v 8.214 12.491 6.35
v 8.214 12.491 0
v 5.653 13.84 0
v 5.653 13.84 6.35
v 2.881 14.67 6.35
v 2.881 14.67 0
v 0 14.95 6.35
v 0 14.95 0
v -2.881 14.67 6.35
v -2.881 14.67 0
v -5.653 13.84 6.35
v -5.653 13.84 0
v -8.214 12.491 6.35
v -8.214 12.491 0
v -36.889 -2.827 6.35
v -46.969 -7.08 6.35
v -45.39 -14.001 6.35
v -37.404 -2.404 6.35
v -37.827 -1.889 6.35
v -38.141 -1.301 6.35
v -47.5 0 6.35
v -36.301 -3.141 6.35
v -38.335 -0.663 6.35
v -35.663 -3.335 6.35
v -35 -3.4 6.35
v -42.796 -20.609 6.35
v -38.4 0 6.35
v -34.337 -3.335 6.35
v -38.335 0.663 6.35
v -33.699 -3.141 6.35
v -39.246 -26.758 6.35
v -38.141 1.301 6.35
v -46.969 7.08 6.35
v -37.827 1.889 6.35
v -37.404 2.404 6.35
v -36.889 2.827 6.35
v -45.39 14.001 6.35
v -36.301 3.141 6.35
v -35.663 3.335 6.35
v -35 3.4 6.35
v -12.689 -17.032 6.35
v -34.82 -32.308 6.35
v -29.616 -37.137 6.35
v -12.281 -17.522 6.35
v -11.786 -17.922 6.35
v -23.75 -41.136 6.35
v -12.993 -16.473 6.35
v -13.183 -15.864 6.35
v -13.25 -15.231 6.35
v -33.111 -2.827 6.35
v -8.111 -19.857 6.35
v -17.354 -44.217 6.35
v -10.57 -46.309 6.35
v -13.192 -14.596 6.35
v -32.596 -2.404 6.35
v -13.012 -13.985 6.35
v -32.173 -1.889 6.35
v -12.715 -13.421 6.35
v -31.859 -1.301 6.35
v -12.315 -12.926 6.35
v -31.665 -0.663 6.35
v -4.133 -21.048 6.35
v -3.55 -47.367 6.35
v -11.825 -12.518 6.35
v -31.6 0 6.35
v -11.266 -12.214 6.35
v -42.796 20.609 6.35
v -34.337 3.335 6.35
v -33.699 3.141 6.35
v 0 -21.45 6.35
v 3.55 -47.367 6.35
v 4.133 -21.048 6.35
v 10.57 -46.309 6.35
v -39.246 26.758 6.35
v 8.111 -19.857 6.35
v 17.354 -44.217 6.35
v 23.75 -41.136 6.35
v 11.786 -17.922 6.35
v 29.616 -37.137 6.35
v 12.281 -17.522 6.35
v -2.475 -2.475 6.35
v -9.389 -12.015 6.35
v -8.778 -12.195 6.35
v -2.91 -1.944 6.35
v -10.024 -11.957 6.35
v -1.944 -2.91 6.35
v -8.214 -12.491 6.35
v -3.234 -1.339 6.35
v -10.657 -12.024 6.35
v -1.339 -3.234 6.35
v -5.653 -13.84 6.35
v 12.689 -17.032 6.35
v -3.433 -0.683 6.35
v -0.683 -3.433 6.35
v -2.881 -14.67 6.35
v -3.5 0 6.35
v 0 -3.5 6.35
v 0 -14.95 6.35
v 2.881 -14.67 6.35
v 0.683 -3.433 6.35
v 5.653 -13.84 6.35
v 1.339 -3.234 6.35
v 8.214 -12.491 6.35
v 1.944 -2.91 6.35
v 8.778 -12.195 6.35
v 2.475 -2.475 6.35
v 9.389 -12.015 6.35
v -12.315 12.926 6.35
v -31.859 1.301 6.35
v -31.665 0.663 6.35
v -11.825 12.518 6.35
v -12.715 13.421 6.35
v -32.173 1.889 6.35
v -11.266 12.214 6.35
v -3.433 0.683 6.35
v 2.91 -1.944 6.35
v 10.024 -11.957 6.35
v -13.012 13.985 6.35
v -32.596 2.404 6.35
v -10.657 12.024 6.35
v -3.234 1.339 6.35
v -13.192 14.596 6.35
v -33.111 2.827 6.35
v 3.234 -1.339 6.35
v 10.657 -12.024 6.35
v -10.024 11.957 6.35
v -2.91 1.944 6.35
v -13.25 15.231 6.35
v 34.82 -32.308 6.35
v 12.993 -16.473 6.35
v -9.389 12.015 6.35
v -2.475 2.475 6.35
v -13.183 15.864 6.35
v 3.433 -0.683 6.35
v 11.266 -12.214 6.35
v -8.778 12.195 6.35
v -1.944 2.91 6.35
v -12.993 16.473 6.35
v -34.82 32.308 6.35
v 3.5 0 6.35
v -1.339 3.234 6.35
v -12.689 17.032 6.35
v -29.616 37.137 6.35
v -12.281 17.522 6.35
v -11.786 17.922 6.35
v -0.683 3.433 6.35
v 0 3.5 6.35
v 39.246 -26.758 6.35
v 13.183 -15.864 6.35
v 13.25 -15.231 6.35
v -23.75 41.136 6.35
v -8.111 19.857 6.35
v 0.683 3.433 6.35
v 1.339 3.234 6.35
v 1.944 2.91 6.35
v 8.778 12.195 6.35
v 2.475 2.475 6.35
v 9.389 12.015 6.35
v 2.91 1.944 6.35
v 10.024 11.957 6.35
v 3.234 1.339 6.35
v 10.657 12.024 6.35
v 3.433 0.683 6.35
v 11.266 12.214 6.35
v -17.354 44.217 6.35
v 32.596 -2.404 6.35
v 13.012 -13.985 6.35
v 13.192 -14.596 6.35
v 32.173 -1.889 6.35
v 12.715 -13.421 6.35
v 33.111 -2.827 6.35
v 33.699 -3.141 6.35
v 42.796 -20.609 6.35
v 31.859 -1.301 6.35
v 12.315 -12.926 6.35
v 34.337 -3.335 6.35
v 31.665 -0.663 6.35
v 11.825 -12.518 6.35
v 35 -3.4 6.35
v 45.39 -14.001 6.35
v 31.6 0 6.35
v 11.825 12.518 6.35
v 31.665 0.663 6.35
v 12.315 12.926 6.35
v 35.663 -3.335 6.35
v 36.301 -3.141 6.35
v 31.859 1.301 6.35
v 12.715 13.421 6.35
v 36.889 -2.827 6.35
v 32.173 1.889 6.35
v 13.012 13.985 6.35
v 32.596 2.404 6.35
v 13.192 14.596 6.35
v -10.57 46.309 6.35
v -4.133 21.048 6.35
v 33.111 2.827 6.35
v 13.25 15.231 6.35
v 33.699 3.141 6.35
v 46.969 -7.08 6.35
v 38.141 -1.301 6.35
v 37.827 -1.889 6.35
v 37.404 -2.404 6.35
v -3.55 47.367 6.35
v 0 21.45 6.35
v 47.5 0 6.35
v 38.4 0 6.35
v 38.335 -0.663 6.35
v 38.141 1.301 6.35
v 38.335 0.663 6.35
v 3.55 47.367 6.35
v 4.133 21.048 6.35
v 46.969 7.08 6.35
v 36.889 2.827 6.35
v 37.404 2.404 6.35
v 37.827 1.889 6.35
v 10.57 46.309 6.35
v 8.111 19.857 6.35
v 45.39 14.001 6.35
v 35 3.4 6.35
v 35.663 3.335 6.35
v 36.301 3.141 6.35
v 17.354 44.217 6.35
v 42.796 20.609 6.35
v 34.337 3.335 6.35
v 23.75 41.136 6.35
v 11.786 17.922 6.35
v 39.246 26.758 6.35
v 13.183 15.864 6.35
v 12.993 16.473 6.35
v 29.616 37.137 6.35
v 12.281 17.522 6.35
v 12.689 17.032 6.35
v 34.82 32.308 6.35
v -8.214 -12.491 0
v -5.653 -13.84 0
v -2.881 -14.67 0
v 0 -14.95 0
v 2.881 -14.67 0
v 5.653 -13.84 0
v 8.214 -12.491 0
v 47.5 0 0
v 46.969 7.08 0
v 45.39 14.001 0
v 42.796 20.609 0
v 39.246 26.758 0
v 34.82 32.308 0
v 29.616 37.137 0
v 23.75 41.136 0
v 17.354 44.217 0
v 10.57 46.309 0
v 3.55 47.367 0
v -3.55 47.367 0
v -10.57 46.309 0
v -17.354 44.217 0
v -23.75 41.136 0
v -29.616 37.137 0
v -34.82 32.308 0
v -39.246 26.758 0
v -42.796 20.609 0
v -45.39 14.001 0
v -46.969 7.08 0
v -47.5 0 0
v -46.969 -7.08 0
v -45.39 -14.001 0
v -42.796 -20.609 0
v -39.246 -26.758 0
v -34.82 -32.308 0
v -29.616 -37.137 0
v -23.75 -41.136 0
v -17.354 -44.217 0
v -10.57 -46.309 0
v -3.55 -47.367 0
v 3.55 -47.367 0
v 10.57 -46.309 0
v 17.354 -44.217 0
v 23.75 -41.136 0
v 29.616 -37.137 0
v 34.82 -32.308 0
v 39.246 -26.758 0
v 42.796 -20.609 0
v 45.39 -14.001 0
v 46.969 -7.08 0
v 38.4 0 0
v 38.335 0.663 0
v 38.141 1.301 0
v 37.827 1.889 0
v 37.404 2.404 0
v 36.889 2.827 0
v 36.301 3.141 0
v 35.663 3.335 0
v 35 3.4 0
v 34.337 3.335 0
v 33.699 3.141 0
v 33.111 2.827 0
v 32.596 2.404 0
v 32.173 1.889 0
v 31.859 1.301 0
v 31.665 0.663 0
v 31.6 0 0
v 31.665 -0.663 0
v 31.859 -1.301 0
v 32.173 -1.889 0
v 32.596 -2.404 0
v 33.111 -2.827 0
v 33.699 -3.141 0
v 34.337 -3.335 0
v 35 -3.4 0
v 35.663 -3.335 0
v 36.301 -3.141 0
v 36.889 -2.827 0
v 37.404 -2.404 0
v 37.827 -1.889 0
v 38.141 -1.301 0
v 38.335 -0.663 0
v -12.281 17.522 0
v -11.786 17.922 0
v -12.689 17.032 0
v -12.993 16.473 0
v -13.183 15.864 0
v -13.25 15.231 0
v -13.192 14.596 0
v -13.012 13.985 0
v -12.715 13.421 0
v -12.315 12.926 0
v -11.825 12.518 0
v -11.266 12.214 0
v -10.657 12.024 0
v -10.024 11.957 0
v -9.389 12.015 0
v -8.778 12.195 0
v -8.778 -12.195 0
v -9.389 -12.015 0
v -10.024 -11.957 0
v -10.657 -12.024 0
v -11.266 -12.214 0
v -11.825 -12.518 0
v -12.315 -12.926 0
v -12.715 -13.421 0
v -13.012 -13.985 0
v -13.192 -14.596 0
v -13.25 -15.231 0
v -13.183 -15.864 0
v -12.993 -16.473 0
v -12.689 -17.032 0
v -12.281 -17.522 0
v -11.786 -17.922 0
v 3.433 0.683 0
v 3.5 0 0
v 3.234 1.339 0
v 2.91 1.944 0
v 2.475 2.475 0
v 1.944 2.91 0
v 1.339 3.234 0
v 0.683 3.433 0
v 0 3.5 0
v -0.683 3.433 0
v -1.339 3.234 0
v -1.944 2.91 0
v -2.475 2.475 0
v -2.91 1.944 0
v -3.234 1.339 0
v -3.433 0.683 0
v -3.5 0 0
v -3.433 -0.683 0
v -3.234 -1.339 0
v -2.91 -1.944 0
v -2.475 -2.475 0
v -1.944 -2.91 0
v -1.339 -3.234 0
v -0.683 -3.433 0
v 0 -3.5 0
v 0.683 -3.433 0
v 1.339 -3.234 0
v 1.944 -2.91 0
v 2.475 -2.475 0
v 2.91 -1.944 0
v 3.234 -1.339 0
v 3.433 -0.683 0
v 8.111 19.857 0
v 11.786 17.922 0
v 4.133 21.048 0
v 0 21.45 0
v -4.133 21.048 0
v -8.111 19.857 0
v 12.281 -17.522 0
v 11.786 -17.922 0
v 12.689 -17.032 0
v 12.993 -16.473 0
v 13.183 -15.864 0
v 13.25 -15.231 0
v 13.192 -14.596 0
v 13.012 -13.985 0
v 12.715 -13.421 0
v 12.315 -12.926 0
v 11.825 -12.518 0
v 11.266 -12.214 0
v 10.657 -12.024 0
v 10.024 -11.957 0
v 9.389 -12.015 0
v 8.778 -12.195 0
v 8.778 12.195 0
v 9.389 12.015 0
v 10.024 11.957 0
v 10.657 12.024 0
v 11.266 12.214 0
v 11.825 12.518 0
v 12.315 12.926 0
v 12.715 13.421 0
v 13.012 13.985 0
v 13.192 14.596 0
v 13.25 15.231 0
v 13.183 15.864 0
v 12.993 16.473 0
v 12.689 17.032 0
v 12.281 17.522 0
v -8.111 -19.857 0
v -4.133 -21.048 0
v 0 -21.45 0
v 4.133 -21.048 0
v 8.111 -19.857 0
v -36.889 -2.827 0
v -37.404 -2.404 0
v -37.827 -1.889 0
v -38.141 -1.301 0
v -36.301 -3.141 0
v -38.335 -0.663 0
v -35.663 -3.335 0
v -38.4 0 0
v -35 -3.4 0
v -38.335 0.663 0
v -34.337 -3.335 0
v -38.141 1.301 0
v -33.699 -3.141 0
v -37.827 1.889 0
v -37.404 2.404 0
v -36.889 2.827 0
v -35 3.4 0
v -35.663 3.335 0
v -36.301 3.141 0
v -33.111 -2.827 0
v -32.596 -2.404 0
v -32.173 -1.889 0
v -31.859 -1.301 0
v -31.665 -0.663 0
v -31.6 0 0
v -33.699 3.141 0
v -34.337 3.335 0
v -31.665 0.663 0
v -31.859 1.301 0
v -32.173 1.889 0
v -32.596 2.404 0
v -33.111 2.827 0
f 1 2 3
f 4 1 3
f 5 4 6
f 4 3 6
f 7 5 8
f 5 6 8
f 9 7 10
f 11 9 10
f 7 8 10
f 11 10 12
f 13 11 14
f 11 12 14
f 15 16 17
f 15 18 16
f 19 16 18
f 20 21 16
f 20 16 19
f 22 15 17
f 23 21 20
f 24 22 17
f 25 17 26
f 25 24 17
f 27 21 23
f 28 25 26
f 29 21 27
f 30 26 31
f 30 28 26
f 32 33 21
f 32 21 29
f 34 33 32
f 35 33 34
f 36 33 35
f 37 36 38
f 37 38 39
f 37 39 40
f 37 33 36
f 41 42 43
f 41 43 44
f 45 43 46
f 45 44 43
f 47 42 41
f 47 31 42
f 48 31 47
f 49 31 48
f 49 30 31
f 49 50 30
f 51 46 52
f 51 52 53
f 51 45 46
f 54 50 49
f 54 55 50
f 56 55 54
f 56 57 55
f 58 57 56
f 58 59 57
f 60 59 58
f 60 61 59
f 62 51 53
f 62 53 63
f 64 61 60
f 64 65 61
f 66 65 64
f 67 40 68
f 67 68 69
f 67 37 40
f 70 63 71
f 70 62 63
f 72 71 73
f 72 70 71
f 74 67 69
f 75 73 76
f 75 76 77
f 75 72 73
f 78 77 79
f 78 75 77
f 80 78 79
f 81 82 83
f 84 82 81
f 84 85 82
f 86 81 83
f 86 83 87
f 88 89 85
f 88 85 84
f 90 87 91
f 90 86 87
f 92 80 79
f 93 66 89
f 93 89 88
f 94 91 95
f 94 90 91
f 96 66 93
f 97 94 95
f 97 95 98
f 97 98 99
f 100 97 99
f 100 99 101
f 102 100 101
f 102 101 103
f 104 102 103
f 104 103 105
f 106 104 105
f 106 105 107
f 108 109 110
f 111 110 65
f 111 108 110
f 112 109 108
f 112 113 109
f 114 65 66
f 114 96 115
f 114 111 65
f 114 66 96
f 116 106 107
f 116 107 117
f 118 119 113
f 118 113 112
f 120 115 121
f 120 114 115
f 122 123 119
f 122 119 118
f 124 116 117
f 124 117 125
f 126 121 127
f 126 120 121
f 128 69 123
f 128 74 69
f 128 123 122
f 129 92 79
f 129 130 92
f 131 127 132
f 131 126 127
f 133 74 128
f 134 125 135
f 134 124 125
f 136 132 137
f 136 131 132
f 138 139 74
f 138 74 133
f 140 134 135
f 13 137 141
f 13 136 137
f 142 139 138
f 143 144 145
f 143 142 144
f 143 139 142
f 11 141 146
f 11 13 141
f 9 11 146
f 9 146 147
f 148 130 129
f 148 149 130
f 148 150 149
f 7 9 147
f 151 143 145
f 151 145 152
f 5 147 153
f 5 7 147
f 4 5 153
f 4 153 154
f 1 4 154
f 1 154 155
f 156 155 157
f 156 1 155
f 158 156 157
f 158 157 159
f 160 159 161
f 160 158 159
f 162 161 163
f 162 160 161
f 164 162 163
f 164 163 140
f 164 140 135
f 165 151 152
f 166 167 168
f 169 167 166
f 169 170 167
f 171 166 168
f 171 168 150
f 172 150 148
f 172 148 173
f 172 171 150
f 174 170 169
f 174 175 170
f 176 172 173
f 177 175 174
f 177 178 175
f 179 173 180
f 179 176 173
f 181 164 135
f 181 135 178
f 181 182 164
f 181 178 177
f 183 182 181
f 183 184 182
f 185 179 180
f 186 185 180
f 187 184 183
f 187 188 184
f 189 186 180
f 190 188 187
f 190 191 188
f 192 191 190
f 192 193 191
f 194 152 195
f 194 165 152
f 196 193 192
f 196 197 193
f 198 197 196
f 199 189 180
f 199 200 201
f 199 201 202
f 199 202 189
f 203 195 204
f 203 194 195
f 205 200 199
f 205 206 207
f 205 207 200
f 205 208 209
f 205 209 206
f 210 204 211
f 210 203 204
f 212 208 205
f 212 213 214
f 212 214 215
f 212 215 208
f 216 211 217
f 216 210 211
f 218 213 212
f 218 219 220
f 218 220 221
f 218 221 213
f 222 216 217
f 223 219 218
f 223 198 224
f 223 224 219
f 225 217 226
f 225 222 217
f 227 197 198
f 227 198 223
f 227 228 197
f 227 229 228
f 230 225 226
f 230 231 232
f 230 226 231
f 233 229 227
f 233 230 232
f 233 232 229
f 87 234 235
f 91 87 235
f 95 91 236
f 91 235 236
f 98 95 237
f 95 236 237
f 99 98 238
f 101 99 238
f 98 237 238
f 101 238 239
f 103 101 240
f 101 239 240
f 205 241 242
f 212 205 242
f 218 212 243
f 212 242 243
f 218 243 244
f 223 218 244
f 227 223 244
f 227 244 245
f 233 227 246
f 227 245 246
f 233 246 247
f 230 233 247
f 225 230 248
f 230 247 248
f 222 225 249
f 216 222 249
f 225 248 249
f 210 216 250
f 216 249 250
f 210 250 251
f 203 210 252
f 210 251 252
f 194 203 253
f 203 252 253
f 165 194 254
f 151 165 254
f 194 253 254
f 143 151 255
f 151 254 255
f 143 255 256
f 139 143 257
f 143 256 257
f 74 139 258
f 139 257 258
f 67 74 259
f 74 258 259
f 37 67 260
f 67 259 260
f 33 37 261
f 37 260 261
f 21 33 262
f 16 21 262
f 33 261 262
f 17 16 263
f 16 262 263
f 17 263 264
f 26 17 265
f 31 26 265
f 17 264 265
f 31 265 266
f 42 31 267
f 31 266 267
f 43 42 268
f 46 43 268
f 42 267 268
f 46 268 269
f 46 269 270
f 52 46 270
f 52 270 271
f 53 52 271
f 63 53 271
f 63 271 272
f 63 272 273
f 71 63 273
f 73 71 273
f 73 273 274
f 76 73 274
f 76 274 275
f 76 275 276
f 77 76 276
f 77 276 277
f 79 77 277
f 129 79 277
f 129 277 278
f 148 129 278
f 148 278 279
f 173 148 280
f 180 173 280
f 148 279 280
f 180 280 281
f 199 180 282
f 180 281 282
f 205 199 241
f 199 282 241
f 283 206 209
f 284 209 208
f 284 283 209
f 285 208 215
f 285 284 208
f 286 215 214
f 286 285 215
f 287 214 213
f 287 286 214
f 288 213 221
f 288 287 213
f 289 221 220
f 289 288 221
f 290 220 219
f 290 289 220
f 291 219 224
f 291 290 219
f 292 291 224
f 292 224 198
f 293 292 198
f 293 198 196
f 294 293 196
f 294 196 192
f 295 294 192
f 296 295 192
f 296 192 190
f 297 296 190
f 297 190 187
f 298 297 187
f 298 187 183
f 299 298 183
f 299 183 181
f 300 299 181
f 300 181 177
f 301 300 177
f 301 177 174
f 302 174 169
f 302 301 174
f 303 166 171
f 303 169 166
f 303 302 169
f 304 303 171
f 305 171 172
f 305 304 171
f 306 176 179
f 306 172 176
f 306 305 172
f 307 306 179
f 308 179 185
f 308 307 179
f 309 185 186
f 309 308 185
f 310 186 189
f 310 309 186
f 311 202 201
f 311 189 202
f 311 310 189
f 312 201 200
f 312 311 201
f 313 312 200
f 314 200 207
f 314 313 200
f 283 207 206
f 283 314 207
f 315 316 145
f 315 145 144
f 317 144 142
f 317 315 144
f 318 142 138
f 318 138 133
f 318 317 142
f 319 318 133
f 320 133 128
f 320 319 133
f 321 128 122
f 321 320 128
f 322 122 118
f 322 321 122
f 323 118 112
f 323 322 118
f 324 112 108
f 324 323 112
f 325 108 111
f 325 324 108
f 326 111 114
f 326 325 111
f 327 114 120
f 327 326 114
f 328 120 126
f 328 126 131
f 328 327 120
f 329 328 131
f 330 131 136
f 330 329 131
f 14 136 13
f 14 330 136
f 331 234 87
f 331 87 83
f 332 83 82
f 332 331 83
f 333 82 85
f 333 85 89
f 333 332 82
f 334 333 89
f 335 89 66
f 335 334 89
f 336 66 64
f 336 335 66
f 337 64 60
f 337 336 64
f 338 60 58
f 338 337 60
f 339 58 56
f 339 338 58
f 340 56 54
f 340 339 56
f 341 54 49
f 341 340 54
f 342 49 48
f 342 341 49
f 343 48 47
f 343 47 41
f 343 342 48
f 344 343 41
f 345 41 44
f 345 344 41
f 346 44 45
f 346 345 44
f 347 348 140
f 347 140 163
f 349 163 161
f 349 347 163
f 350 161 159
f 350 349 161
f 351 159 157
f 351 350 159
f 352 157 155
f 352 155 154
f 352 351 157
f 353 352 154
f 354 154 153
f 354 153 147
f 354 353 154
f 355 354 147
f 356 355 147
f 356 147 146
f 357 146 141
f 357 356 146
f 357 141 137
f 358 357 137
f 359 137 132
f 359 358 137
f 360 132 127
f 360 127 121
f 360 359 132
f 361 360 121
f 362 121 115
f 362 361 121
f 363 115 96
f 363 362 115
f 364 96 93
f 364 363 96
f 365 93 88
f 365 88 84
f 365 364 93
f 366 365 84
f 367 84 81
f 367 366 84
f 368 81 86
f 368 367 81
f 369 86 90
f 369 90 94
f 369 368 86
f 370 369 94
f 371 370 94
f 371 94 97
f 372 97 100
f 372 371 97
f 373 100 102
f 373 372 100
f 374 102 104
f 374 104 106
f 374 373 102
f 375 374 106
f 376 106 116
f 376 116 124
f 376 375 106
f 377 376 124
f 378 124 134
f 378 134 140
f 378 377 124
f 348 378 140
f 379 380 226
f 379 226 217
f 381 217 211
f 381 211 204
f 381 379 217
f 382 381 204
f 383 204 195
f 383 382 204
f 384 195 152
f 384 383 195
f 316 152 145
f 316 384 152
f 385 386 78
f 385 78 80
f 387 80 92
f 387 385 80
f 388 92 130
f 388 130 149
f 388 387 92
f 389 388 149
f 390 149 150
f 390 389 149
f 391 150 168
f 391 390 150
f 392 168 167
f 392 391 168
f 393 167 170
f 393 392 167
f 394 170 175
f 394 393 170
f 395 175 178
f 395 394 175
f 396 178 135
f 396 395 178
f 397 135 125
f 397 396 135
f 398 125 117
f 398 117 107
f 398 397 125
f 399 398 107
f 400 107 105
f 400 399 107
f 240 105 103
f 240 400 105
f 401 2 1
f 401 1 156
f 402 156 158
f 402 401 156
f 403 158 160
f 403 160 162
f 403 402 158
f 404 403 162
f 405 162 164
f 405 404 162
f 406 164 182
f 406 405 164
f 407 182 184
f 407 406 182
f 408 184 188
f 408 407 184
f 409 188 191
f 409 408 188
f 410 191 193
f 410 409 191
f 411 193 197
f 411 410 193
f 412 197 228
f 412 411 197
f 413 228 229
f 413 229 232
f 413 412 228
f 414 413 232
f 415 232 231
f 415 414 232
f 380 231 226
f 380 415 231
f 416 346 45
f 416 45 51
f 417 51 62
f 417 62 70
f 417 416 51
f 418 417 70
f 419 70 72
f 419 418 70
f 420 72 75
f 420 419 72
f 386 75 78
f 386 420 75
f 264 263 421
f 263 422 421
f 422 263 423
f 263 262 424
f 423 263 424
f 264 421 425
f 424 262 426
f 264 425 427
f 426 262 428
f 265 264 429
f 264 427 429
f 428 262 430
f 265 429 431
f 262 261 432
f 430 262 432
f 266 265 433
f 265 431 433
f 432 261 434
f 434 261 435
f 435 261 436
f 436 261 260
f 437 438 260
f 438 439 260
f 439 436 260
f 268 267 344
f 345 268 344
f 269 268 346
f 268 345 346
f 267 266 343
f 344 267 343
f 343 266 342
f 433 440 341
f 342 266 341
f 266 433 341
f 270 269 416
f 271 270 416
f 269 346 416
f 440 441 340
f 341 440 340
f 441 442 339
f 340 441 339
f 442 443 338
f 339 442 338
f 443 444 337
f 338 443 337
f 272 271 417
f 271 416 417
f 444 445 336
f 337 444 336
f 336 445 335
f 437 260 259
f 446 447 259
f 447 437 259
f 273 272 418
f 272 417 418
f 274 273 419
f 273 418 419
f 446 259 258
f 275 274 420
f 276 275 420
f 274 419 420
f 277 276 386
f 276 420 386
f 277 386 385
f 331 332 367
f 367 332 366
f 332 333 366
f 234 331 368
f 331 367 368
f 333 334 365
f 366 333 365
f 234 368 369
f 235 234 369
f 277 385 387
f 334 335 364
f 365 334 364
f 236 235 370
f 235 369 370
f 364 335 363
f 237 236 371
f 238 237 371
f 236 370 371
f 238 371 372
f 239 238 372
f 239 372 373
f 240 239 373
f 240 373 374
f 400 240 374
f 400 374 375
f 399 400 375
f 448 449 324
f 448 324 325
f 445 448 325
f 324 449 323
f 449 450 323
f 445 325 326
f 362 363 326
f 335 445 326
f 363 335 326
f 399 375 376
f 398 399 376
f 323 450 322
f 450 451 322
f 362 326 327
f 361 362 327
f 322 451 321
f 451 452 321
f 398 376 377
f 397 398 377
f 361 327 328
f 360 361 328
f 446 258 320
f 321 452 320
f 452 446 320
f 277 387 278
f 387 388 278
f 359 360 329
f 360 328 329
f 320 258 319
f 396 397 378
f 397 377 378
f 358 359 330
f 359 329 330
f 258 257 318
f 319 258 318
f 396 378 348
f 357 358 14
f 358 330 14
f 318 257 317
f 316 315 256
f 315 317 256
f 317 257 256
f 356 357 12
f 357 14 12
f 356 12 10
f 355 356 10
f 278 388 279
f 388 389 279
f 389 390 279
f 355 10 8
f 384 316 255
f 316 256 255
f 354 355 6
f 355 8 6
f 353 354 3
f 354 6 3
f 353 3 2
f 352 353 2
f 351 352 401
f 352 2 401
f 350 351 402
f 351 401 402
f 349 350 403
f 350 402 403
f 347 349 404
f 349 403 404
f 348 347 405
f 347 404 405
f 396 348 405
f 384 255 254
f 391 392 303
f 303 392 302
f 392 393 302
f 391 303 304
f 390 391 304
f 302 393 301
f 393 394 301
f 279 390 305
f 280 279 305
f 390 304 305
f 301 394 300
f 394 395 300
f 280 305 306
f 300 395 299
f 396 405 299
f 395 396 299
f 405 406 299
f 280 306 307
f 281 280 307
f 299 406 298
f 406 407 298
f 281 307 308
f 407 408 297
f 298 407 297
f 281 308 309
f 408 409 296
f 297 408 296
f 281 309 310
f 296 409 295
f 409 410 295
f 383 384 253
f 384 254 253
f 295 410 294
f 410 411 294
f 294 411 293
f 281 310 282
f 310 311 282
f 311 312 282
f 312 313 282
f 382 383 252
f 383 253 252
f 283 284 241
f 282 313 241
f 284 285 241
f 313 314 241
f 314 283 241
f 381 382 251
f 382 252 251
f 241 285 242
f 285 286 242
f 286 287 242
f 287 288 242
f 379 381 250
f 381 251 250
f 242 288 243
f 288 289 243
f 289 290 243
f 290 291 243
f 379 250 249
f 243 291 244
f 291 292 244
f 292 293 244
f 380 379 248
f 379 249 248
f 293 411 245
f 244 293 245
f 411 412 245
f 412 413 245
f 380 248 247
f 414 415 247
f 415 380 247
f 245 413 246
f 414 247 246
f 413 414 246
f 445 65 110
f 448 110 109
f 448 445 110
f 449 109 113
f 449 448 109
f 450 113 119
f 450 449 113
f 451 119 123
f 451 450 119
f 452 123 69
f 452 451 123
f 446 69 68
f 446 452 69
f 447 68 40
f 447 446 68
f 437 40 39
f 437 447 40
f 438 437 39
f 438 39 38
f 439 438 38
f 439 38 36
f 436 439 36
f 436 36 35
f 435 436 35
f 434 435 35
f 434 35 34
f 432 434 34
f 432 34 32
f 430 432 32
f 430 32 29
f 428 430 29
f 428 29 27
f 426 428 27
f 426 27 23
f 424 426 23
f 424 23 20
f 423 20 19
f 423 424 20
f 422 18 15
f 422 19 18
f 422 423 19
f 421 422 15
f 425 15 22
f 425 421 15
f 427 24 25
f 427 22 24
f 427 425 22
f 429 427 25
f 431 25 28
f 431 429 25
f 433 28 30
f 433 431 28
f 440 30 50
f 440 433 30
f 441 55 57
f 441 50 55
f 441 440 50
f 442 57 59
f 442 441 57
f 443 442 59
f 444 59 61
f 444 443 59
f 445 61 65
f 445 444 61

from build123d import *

# Parameters (mm, degrees)
SKETCH001_R   = 47.5
SKETCH001_R_2 = 3.5
PAD_DEPTH     = 6.35
SKETCH_R      = 3.4
HOLE_DEPTH    = 6.351


with BuildPart() as part:
    # Sketch001 → Pad (new body)
    with BuildSketch(Plane.XY):
        Circle(SKETCH001_R)
        Circle(SKETCH001_R_2, mode=Mode.SUBTRACT)
        with BuildLine():
            ThreePointArc((8.214313, 12.491428), (0, 14.950275), (-8.214313, 12.491428))
            ThreePointArc((-11.785687, 17.922384), (-12.715478, 13.421219), (-8.214313, 12.491428))
            ThreePointArc((11.785687, 17.922384), (0, 21.450275), (-11.785687, 17.922384))
            ThreePointArc((8.214313, 12.491428), (12.715478, 13.421219), (11.785687, 17.922384))
        make_face(mode=Mode.SUBTRACT)
        with BuildLine():
            ThreePointArc((-8.214313, -12.491428), (0, -14.950275), (8.214313, -12.491428))
            ThreePointArc((11.785687, -17.922384), (12.715478, -13.421219), (8.214313, -12.491428))
            ThreePointArc((-11.785687, -17.922384), (0, -21.450275), (11.785687, -17.922384))
            ThreePointArc((-8.214313, -12.491428), (-12.715478, -13.421219), (-11.785687, -17.922384))
        make_face(mode=Mode.SUBTRACT)
    extrude(amount=PAD_DEPTH)

    # Sketch → Hole (cut, through all)
    with BuildSketch(Plane.XY):
        with Locations((-35, 0)):
            Circle(SKETCH_R)
        with Locations((35, 0)):
            Circle(SKETCH_R)
    extrude(amount=HOLE_DEPTH, mode=Mode.SUBTRACT)


solid = part.part
